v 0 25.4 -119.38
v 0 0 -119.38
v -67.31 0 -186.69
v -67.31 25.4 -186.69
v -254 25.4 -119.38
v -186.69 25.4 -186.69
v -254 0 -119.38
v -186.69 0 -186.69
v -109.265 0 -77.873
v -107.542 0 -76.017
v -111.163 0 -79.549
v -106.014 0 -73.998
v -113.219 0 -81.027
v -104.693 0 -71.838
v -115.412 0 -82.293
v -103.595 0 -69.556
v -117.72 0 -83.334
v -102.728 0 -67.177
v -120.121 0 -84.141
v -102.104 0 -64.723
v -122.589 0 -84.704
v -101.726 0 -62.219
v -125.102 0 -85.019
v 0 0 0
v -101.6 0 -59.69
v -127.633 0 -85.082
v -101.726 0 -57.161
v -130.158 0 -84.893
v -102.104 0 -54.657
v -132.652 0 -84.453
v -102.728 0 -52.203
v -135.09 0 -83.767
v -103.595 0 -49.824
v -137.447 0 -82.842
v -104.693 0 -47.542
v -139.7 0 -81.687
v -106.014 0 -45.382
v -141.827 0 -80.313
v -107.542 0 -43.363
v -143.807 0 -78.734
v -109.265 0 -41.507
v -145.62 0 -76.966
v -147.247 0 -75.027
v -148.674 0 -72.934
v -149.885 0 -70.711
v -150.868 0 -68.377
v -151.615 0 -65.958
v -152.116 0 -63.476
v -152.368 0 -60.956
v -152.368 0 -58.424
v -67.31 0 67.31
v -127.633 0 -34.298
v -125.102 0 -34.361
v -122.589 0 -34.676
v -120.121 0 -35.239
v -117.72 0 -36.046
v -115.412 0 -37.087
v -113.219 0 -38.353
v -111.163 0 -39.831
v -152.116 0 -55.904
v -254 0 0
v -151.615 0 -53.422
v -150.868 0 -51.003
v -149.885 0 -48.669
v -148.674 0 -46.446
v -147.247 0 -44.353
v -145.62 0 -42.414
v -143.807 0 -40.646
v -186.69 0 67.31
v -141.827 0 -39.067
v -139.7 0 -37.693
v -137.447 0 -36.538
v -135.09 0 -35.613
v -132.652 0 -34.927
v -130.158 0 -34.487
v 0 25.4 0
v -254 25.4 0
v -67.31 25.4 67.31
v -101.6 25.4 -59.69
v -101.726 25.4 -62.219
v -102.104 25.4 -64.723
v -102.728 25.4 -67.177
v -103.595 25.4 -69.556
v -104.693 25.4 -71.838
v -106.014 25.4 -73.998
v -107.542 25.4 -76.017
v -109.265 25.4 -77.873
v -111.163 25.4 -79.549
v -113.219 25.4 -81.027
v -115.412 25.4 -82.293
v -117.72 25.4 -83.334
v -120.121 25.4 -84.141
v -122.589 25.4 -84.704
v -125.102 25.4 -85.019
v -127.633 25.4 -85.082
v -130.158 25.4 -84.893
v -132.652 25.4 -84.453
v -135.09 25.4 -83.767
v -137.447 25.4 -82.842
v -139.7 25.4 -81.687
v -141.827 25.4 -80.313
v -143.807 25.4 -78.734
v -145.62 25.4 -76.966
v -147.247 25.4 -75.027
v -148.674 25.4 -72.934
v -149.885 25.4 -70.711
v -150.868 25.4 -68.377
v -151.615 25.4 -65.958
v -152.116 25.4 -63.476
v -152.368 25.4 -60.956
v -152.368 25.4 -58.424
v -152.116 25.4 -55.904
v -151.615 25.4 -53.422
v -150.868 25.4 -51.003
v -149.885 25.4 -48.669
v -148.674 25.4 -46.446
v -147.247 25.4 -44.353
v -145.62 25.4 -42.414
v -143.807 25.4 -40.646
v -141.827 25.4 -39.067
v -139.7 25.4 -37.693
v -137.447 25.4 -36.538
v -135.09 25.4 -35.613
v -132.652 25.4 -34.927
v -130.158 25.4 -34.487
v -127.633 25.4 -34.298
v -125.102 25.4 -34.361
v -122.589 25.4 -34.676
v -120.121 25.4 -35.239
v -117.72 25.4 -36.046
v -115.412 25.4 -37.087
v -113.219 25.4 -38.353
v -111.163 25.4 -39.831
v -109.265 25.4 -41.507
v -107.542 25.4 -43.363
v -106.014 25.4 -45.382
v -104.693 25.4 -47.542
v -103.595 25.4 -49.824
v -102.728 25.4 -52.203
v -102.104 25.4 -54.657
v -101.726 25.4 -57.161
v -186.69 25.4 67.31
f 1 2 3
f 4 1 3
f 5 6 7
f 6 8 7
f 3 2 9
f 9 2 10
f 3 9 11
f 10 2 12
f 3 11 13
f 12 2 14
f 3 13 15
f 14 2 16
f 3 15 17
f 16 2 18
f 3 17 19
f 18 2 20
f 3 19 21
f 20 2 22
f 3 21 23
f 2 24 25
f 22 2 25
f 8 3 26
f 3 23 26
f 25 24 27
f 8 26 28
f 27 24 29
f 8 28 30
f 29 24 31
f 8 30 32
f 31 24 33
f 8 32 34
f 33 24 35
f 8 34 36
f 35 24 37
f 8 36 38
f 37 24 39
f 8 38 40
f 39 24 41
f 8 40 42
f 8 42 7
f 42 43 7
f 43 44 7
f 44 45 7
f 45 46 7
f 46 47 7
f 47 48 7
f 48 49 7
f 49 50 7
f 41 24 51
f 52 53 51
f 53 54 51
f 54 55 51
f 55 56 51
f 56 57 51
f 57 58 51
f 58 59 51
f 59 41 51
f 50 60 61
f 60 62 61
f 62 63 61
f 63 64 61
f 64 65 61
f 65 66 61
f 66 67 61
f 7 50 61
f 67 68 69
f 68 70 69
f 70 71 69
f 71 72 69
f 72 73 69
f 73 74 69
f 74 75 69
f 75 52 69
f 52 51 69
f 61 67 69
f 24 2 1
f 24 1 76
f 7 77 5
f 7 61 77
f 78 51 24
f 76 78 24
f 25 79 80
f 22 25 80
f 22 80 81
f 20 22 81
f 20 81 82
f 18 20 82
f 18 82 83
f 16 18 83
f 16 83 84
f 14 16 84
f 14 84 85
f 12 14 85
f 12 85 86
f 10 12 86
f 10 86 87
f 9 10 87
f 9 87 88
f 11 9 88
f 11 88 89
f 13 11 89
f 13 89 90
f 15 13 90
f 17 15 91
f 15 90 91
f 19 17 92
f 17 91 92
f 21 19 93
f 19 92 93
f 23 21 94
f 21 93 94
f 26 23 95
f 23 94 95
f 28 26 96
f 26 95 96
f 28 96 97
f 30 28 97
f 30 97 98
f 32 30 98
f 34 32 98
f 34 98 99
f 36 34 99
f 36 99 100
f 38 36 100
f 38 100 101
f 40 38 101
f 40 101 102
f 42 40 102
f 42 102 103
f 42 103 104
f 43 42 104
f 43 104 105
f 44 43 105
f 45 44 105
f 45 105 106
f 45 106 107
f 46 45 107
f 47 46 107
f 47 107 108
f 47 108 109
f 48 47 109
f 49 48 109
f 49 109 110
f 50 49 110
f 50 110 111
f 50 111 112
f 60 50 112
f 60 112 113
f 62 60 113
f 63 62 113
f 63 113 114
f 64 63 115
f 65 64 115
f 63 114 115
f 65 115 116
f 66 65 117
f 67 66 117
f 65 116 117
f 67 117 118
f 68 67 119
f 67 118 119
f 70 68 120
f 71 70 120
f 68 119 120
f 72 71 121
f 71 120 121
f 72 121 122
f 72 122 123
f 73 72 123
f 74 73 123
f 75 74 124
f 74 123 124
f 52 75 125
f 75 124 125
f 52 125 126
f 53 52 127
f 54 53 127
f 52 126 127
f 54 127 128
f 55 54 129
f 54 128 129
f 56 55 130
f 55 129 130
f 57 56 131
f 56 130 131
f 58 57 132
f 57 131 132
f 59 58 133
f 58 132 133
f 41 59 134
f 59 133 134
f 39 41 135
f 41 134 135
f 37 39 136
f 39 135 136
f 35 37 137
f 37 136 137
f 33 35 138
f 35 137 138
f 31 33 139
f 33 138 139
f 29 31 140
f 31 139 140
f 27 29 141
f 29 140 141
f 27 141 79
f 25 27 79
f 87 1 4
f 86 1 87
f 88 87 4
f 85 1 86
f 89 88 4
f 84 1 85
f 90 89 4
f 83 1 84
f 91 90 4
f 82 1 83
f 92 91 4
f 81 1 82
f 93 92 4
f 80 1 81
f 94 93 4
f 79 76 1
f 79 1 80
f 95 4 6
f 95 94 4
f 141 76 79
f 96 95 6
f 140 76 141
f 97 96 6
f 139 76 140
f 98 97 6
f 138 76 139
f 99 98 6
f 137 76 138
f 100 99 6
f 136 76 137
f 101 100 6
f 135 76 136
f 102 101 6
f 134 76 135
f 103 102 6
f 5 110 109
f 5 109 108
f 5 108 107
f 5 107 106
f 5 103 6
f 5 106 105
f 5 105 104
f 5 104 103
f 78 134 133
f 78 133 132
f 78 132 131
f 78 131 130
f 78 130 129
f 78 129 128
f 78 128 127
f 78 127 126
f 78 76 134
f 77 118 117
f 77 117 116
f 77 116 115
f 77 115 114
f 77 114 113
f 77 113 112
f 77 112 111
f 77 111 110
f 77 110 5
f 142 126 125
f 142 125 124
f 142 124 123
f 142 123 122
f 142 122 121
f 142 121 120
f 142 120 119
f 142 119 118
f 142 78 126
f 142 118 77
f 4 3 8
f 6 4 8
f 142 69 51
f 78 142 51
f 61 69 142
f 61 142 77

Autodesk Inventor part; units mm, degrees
ref_plane "YZ Plane" through (0, 0, 0) normal (1, 0, 0) x (0, 1, 0)
ref_plane "XZ Plane" through (0, 0, 0) normal (0, 1, 0) x (-1, 0, 0)
ref_plane "XY Plane" through (0, 0, 0) normal (0, 0, 1) x (1, 0, 0)
sketch "Sketch1" plane through (0, 0, 0) normal (0, 1, 0) x (-1, 0, 0)
  line L0 (0, 0) -> (254, 0)
  line L1 (254, 0) -> (254, -119.38)
  line L2 (254, -119.38) -> (0, -119.38)
  line L3 (0, -119.38) -> (0, 0)
  line L4 (186.69, 67.31) -> (67.31, 67.31)
  line L5 (67.31, 67.31) -> (67.31, -186.69)
  line L6 (67.31, -186.69) -> (186.69, -186.69)
  line L7 (186.69, -186.69) -> (186.69, 67.31)
  line L8 (186.69, 67.31) -> (254, 0)
  line L9 (67.31, 67.31) -> (0, 0)
  line L10 (186.69, -186.69) -> (254, -119.38)
  line L11 (0, -119.38) -> (67.31, -186.69)
  line L12 (62.2907, -7.1202) -> (161.0967, -7.1202)
  line L13 (164.2717, -10.2952) -> (164.2717, -109.1012)
  line L14 (161.0967, -112.2762) -> (62.2907, -112.2762)
  line L15 (59.1157, -109.1012) -> (59.1157, -10.2952)
  arc A0 (62.2907, -7.1202) -> (59.1157, -10.2952) centre (62.2907, -10.2952) ccw
  arc A1 (164.2717, -10.2952) -> (161.0967, -7.1202) centre (161.0967, -10.2952) ccw
  arc A2 (161.0967, -112.2762) -> (164.2717, -109.1012) centre (161.0967, -109.1012) ccw
  arc A3 (59.1157, -109.1012) -> (62.2907, -112.2762) centre (62.2907, -109.1012) ccw
  point P0 (164.2717, -112.2762)
  point P1 (164.2717, -7.1202)
  point P2 (59.1157, -112.2762)
  dimension "d0" = 254
  dimension "d1" = 119.38
  dimension "d2" = 119.38
  dimension "d3" = 254
  dimension "d8" = 95.1907
  dimension "d14" = 105.156
  dimension "d15" = 105.156
  dimension "d22" = 3.175
extrude "Extrusion1" add sketch "Sketch1" along normal blind 25.4
sketch "Sketch4" plane through (0, 25.4, 0) normal (0, 1, 0) x (1, 0, 0)
  circle A0 centre (-127, 59.69) radius 25.4
  line L0 (-254, 59.69) -> (-127, 59.69)
  line L1 (-127, 59.69) -> (-127, 186.69)
  line L2 (-254, 119.38) -> (-254, 0) projected
  line L3 (-67.31, 186.69) -> (-186.69, 186.69) projected
  point P0 (0, 0)
  dimension "d50" = 50.8
  dimension "d58" = 127
  dimension "d59" = 127
extrude "Extrusion3" cut sketch "Sketch4" against normal blind 25.4
equation "\"d0\" = rectangle_L"
equation "\"d1\" = rectangle_01_w"
equation "\"d2\" = rectangle_01_w"
equation "\"d3\" = rectangle_L"
equation "\"d8\" = d9"
equation "\"d14\" = window_L"
equation "\"d15\" = window_L"
equation "\"rectangle_L\" = 254"
equation "\"rectangle_01_w\" = 119.38"
equation "\"d9\" = 95.19071"
equation "\"window_L\" = 105.156"
equation "\"test\" = 74.422"
equation "\"electrode_diam\" = 50.8"
equation "\"test_points\" = 127"
properties part number "chamber_base"
